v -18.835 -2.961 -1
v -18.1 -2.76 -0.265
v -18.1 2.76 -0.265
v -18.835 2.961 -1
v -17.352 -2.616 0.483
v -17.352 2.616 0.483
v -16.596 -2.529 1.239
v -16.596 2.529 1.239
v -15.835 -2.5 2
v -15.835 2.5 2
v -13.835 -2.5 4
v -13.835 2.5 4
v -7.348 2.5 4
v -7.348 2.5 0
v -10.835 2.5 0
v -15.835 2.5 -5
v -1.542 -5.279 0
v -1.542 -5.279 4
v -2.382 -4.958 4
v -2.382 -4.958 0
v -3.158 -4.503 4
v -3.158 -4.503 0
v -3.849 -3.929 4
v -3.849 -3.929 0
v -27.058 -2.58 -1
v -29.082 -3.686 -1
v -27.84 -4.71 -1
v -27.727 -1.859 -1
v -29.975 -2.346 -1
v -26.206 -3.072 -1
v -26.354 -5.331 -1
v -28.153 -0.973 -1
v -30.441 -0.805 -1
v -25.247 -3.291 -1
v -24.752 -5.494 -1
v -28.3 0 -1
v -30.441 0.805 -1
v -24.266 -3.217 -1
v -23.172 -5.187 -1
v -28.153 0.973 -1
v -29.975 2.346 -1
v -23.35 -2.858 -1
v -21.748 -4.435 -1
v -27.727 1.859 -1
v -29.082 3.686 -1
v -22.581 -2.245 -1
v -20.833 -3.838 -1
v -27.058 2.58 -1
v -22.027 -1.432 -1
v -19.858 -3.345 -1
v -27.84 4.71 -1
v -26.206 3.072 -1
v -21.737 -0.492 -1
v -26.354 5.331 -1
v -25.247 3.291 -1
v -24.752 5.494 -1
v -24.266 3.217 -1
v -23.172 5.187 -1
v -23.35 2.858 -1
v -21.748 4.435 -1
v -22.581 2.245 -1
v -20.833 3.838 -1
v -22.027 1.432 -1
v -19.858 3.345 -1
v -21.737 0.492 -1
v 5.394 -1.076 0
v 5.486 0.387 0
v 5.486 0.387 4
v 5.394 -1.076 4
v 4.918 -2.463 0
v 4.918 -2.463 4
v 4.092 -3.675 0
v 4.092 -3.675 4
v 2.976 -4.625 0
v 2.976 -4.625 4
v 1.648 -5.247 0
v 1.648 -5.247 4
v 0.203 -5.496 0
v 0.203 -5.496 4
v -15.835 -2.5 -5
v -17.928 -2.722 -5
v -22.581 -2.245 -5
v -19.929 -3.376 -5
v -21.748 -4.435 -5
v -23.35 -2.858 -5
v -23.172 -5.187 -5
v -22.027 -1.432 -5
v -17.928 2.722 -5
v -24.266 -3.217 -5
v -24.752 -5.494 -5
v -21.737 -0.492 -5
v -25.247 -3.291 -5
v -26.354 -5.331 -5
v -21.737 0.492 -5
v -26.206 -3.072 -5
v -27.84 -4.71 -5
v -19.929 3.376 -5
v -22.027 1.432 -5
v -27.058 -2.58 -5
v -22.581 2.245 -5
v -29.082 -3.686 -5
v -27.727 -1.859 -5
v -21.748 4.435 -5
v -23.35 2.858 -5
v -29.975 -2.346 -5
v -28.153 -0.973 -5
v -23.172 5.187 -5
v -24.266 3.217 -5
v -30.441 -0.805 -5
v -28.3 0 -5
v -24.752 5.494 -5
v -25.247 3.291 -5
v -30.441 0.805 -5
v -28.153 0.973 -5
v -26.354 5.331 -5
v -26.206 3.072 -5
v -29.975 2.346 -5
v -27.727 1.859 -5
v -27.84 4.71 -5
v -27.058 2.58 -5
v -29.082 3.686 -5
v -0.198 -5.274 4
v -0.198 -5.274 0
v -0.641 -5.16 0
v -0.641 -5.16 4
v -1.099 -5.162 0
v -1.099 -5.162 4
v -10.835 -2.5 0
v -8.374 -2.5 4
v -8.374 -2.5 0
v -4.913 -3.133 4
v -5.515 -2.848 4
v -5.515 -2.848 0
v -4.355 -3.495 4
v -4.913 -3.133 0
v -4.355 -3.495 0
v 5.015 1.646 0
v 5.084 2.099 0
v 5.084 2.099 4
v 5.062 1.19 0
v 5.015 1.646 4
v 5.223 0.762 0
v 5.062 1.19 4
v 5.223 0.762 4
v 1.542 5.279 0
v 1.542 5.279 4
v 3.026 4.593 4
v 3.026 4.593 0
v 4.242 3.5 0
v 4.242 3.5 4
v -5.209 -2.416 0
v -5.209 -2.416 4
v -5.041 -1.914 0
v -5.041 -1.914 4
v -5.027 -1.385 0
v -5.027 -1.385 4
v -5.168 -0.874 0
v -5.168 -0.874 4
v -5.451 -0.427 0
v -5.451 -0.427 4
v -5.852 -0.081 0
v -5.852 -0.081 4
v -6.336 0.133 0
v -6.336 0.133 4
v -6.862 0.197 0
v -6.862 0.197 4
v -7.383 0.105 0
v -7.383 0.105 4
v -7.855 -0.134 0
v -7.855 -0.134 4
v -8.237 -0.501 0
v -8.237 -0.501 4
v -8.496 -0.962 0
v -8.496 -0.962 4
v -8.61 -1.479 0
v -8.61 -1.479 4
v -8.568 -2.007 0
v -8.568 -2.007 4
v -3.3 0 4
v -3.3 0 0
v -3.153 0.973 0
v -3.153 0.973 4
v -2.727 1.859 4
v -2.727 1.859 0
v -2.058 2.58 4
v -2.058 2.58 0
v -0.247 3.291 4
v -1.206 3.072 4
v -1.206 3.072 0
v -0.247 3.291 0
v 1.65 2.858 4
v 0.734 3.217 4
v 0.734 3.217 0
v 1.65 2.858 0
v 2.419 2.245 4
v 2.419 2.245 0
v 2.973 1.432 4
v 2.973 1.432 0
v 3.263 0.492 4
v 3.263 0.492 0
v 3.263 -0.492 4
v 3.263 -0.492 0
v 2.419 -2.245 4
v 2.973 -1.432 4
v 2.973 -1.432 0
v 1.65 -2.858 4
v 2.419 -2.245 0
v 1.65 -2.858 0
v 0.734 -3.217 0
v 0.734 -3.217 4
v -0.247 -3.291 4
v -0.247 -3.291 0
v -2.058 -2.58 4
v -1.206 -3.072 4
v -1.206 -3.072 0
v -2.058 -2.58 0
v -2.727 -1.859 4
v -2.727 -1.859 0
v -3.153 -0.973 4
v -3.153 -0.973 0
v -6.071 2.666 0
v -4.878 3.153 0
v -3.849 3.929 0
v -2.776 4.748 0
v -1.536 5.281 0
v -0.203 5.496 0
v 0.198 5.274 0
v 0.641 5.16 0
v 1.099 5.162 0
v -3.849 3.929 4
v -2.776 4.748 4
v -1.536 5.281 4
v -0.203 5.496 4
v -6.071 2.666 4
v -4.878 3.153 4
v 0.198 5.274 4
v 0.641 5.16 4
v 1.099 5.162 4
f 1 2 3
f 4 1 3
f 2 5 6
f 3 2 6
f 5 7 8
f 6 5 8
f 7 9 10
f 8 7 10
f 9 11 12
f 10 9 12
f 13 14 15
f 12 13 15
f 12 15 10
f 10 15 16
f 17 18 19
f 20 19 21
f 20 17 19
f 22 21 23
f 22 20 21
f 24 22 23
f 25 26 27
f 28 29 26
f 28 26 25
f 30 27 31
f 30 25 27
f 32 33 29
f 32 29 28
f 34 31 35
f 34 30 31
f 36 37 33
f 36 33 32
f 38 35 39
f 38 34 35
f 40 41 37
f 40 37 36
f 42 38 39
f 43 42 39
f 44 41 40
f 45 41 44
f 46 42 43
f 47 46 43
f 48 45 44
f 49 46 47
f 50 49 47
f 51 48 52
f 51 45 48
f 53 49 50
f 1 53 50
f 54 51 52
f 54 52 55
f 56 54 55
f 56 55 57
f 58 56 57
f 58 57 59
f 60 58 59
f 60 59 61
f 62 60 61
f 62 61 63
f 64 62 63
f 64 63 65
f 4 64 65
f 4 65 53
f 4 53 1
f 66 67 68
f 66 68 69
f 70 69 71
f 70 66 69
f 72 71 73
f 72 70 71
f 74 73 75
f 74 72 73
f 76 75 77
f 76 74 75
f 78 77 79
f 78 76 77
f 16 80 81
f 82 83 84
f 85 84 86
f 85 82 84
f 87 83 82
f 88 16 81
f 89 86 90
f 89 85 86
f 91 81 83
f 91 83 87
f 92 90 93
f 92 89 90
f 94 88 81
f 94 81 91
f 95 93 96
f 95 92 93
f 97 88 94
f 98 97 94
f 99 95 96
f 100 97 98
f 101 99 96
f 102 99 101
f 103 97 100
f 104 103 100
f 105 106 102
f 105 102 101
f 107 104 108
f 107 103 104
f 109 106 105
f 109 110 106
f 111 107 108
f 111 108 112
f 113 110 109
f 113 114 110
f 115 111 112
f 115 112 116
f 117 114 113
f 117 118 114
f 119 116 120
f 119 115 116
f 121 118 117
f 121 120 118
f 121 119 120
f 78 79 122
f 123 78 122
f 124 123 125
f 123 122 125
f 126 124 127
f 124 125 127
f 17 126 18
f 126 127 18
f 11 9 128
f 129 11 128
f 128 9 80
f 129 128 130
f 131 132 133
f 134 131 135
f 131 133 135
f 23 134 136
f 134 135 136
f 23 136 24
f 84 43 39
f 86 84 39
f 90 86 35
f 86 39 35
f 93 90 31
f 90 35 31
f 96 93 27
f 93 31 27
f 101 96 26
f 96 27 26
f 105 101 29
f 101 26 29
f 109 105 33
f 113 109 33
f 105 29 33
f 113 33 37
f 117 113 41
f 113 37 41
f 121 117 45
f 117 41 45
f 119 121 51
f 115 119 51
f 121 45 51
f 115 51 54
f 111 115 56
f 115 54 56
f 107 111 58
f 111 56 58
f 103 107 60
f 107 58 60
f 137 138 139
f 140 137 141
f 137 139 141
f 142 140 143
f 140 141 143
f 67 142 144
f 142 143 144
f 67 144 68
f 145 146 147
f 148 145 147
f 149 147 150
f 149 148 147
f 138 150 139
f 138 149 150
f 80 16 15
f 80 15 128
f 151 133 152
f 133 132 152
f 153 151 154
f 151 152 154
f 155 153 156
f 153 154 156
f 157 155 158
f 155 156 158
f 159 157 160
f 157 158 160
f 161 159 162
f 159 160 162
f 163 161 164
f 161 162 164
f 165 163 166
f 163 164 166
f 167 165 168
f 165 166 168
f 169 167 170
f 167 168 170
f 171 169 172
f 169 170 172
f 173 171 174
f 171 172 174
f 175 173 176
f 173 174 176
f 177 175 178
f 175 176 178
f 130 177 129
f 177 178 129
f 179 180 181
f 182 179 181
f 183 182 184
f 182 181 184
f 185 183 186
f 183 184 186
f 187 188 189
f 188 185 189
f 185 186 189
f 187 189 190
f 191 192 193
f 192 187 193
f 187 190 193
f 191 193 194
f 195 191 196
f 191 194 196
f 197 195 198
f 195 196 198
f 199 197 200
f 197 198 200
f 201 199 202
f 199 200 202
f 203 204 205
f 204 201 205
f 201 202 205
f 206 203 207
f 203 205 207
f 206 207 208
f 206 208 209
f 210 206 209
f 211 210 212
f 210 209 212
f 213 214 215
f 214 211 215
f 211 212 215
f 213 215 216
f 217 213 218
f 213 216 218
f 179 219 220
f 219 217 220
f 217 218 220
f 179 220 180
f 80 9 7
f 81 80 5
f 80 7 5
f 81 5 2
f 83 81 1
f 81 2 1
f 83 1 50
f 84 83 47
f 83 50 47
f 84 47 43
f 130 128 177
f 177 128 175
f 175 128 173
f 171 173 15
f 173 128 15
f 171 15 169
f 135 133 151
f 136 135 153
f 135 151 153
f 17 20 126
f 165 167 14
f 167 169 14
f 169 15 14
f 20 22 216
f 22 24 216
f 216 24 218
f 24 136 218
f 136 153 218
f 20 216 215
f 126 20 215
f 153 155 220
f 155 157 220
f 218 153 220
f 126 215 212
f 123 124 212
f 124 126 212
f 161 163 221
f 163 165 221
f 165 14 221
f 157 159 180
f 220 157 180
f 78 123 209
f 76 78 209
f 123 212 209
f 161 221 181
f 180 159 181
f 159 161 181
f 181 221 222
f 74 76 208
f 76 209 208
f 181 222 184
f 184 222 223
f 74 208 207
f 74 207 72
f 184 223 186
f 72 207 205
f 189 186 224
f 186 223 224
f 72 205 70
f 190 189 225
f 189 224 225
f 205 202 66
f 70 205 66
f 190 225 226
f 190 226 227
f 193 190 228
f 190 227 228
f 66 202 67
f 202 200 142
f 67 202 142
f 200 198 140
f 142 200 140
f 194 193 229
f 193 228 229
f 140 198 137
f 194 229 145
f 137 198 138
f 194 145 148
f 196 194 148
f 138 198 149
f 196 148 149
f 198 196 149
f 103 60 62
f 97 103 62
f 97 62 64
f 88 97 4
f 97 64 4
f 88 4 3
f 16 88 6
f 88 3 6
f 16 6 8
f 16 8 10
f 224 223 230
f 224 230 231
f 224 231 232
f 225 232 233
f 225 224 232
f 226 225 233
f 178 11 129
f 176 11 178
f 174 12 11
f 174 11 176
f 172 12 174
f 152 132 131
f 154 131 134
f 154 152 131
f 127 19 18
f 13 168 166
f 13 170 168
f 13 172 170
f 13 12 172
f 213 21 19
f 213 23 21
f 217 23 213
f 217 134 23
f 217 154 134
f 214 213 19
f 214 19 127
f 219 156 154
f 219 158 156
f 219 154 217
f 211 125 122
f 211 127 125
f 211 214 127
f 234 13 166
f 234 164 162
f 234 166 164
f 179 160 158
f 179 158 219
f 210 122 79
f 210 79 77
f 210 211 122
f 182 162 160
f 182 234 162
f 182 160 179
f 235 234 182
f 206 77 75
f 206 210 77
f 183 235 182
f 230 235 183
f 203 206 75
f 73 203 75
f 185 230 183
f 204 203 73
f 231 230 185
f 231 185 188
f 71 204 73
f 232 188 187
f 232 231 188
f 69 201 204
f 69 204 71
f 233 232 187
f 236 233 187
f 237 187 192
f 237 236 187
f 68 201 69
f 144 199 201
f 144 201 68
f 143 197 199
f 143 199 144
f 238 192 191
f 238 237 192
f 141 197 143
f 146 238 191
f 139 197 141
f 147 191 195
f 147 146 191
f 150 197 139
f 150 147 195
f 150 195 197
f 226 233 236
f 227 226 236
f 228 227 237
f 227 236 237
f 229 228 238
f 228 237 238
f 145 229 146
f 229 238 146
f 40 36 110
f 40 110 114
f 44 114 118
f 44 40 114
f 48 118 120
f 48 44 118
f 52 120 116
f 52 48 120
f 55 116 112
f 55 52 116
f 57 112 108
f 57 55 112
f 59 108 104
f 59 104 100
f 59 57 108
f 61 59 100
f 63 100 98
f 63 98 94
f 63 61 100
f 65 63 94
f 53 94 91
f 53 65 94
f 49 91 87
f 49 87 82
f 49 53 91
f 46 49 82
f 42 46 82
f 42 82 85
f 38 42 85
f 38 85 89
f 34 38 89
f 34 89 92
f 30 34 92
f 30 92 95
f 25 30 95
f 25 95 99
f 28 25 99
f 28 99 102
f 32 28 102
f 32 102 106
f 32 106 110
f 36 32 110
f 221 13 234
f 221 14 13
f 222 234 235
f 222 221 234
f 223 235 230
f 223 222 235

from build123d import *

# Parameters (mm, degrees)
SKETCH_1_R          = 2
EXTRUDE_1_DEPTH     = 4
FILLET_1_R          = 10
FILLET_2_R          = 2
SKETCH_8_R          = 3.300000000000001
EXTRUDE_3_DEPTH     = 5
CHAMFER_1_SIZE      = 5
SKETCH_9_R          = 3.300000000000001
CUT_EXTRUDE_3_DEPTH = 5
CHAMFER_2_SIZE      = 5
SKETCH_10_R         = 5.5
SKETCH_10_R_2       = 3.3000000000000003
EXTRUDE_4_DEPTH     = 4
SKETCH_11_R         = 3.3000000000000007
CUT_EXTRUDE_4_DEPTH = 4
FILLET_3_R          = 5
SKETCH_12_R         = 1.7999999999999998
SKETCH_12_R_2       = 1.800000000000001
SKETCH_12_R_3       = 1.7999999999999972
SKETCH_12_R_4       = 1.8000000000000007
CUT_EXTRUDE_5_DEPTH = 10


with BuildPart() as part:
    # ｽｹｯﾁ1 → ﾎﾞｽ - 押し出し1 (new body)
    # profile 1 of 5: a face of its own
    with BuildSketch(Plane.XY):
        with BuildLine():
            ThreePointArc((-27.5, 2.1540659228538024), (-27.33345237791561, 2.333452377915602), (-27.15406592285381, 2.49999999999999))
            Line((-27.154065922853814, 2.499999999999997), (-27.499999999999996, 2.499999999999997))
            Line((-27.499999999999996, 2.499999999999997), (-27.499999999999996, 2.154065922853802))
        make_face()
    # profile 2 of 5: a face of its own
    with BuildSketch(Plane.XY):
        with BuildLine():
            Line((-27.5, -2.500000000000003), (-27.154065922853817, -2.500000000000003))
            ThreePointArc((-27.154065922853817, -2.499999999999992), (-27.333452377915613, -2.3334523779156044), (-27.5, -2.1540659228538055))
            Line((-27.5, -2.1540659228538055), (-27.5, -2.500000000000003))
        make_face()
    # profile 3 of 5: a face of its own
    with BuildSketch(Plane.XY):
        with BuildLine():
            ThreePointArc((-20.10102051443362, 2.49999999999994), (-30.499999999999996, -2.39e-15), (-20.101020514433618, -2.4999999999999454))
            Line((-20.1010205144336, -2.500000000000002), (-22.84593407714621, -2.5000000000000027))
            ThreePointArc((-22.845934077146207, -2.5000000000000133), (-25.000000000000018, -3.3000000000000043), (-27.154065922853817, -2.499999999999992))
            Line((-27.154065922853817, -2.500000000000003), (-27.5, -2.500000000000003))
            Line((-27.5, -2.500000000000003), (-27.5, -2.1540659228538055))
            ThreePointArc((-27.5, -2.1540659228538055), (-28.3, -1.19e-15), (-27.5, 2.1540659228538024))
            Line((-27.499999999999996, 2.154065922853802), (-27.499999999999996, 2.499999999999997))
            Line((-27.499999999999996, 2.499999999999997), (-27.154065922853814, 2.499999999999997))
            ThreePointArc((-27.15406592285381, 2.49999999999999), (-25.000000000000014, 3.299999999999998), (-22.845934077146207, 2.500000000000007))
            Line((-22.84593407714621, 2.4999999999999982), (-20.1010205144336, 2.4999999999999987))
        make_face()
    # profile 4 of 5: a face of its own
    with BuildSketch(Plane.XY):
        with BuildLine():
            Line((-22.84593407714621, -2.5000000000000027), (-20.1010205144336, -2.500000000000002))
            ThreePointArc((-20.101020514433618, -2.4999999999999454), (-19.652365608485606, -1.2856151891963796), (-19.500000000000004, -4.41e-15))
            ThreePointArc((-19.500000000000004, -3.06e-15), (-19.652365608485606, 1.2856151891963756), (-20.10102051443362, 2.49999999999994))
            Line((-20.1010205144336, 2.4999999999999987), (-22.84593407714621, 2.4999999999999982))
            ThreePointArc((-22.845934077146207, 2.5000000000000067), (-22.00013187411367, 1.3750604449591433), (-21.7, -3.06e-15))
            ThreePointArc((-21.7, -3.87e-15), (-22.00013187411367, -1.3750604449591517), (-22.845934077146207, -2.5000000000000133))
        make_face()
    # profile 5 of 5: a face of its own
    with BuildSketch(Plane.XY):
        with BuildLine():
            Line((-20.1010205144336, -2.500000000000002), (2.5, -2.4999999999999996))
            Line((2.5, -2.4999999999999996), (2.499999999999999, 2.500000000000005))
            Line((2.499999999999999, 2.500000000000005), (-20.1010205144336, 2.4999999999999987))
            ThreePointArc((-20.10102051443362, 2.49999999999994), (-19.652365608485606, 1.2856151891963756), (-19.500000000000004, -3.06e-15))
            ThreePointArc((-19.500000000000004, -4.41e-15), (-19.652365608485606, -1.2856151891963796), (-20.101020514433618, -2.4999999999999454))
        make_face()
        Circle(SKETCH_1_R, mode=Mode.SUBTRACT)
    extrude(amount=EXTRUDE_1_DEPTH)

    # ﾌｨﾚｯﾄ1
    fillet_1_edges = [part.edges().sort_by_distance(p)[0] for p in [
        (-20.10102051443361, 2.4999999999999694, 2),
        (-20.10102051443361, -2.4999999999999742, 2),
    ]]
    fillet(fillet_1_edges, radius=FILLET_1_R)

    # ﾌｨﾚｯﾄ2
    fillet_2_edges = [part.edges().sort_by_distance(p)[0] for p in [
        (2.499999999999999, 2.500000000000005, 2),
        (2.5, -2.4999999999999996, 2),
    ]]
    fillet(fillet_2_edges, radius=FILLET_2_R)

    # ｽｹｯﾁ8 → ﾎﾞｽ - 押し出し3 (add)
    with BuildSketch(Plane(origin=(0, 0, 0), x_dir=(-1, 0, 0), z_dir=(0, 0, -1))):
        with BuildLine():
            Line((15.83484861008833, 2.5), (15.834848610088294, -2.500000000000004))
            ThreePointArc((15.834848610088294, -2.500000000000004), (18.945703694279587, -2.996180733770167), (21.747849506805537, -4.435483870967743))
            ThreePointArc((21.747849506805537, -4.435483870967743), (30.499999999999996, -3.06e-15), (21.747849506805537, 4.435483870967737))
            ThreePointArc((21.747849506805537, 4.435483870967737), (18.9457036942796, 2.996180733770169), (15.83484861008833, 2.5))
        make_face()
        with Locations((25, -3.06e-15)):
            Circle(SKETCH_8_R, mode=Mode.SUBTRACT)
    extrude(amount=EXTRUDE_3_DEPTH)

    # 面取り1
    chamfer_1_edges = [part.edges().sort_by_distance(p)[0] for p in [
        (-15.834848610088311, -1.78e-15, 0),
    ]]
    chamfer(chamfer_1_edges, length=CHAMFER_1_SIZE - 0.0001)  # a hair under: the kernel refuses the full size

    # ｽｹｯﾁ9 → ｶｯﾄ - 押し出し3 (cut)
    with BuildSketch(Plane.XY.offset(4)):
        with BuildLine():
            Line((-18.834848610088333, -2.960607985830548), (-18.83484861008833, 2.9606079858305425))
            ThreePointArc((-18.83484861008833, 2.9606079858305425), (-20.351950663989726, 3.5783527846792875), (-21.747849506805537, 4.435483870967737))
            ThreePointArc((-21.747849506805537, 4.435483870967737), (-30.499999999999996, -1.29e-15), (-21.747849506805537, -4.435483870967743))
            ThreePointArc((-21.747849506805537, -4.435483870967743), (-20.35195066398973, -3.5783527846792946), (-18.834848610088333, -2.960607985830548))
        make_face()
        with Locations(Location((-25, -3.06e-15, 0), (0, 0, 180))):
            Circle(SKETCH_9_R, mode=Mode.SUBTRACT)
    extrude(amount=-CUT_EXTRUDE_3_DEPTH, mode=Mode.SUBTRACT)

    # 面取り2
    chamfer_2_edges = [part.edges().sort_by_distance(p)[0] for p in [
        (-18.83484861008833, -2.66e-15, 4),
    ]]
    chamfer(chamfer_2_edges, length=CHAMFER_2_SIZE - 0.0001)  # a hair under: the kernel refuses the full size

    # ｽｹｯﾁ10 → ﾎﾞｽ - 押し出し4 (add)
    with BuildSketch(Plane(origin=(0, 0, 0), x_dir=(-1, 0, 0), z_dir=(0, 0, -1))):
        Circle(SKETCH_10_R)
        Circle(SKETCH_10_R_2, mode=Mode.SUBTRACT)
    extrude(amount=-EXTRUDE_4_DEPTH)

    # ｽｹｯﾁ11 → ｶｯﾄ - 押し出し4 (cut)
    with BuildSketch(Plane(origin=(0, 0, 0), x_dir=(-1, 0, 0), z_dir=(0, 0, -1))):
        Circle(SKETCH_11_R)
    extrude(amount=-CUT_EXTRUDE_4_DEPTH, mode=Mode.SUBTRACT)

    # ﾌｨﾚｯﾄ3
    fillet_3_edges = [part.edges().sort_by_distance(p)[0] for p in [
        (-4.898979485566355, 2.5000000000000027, 2),
        (-4.898979485566356, -2.5000000000000004, 2),
    ]]
    fillet(fillet_3_edges, radius=FILLET_3_R)

    # ｽｹｯﾁ12 → ｶｯﾄ - 押し出し5 (cut)
    with BuildSketch(Plane.XY.offset(4)):
        with Locations((-6.8141053858085305, -1.6024880002863613)):
            Circle(SKETCH_12_R)
        with Locations((-0.8630886568357895, -6.946587505419047)):
            Circle(SKETCH_12_R_2)
        with Locations((6.814105385815693, 1.6024880002767492)):
            Circle(SKETCH_12_R_3)
        with Locations((0.8630886568356403, 6.946587505418688)):
            Circle(SKETCH_12_R_4)
    extrude(amount=-CUT_EXTRUDE_5_DEPTH, mode=Mode.SUBTRACT)


solid = part.part
